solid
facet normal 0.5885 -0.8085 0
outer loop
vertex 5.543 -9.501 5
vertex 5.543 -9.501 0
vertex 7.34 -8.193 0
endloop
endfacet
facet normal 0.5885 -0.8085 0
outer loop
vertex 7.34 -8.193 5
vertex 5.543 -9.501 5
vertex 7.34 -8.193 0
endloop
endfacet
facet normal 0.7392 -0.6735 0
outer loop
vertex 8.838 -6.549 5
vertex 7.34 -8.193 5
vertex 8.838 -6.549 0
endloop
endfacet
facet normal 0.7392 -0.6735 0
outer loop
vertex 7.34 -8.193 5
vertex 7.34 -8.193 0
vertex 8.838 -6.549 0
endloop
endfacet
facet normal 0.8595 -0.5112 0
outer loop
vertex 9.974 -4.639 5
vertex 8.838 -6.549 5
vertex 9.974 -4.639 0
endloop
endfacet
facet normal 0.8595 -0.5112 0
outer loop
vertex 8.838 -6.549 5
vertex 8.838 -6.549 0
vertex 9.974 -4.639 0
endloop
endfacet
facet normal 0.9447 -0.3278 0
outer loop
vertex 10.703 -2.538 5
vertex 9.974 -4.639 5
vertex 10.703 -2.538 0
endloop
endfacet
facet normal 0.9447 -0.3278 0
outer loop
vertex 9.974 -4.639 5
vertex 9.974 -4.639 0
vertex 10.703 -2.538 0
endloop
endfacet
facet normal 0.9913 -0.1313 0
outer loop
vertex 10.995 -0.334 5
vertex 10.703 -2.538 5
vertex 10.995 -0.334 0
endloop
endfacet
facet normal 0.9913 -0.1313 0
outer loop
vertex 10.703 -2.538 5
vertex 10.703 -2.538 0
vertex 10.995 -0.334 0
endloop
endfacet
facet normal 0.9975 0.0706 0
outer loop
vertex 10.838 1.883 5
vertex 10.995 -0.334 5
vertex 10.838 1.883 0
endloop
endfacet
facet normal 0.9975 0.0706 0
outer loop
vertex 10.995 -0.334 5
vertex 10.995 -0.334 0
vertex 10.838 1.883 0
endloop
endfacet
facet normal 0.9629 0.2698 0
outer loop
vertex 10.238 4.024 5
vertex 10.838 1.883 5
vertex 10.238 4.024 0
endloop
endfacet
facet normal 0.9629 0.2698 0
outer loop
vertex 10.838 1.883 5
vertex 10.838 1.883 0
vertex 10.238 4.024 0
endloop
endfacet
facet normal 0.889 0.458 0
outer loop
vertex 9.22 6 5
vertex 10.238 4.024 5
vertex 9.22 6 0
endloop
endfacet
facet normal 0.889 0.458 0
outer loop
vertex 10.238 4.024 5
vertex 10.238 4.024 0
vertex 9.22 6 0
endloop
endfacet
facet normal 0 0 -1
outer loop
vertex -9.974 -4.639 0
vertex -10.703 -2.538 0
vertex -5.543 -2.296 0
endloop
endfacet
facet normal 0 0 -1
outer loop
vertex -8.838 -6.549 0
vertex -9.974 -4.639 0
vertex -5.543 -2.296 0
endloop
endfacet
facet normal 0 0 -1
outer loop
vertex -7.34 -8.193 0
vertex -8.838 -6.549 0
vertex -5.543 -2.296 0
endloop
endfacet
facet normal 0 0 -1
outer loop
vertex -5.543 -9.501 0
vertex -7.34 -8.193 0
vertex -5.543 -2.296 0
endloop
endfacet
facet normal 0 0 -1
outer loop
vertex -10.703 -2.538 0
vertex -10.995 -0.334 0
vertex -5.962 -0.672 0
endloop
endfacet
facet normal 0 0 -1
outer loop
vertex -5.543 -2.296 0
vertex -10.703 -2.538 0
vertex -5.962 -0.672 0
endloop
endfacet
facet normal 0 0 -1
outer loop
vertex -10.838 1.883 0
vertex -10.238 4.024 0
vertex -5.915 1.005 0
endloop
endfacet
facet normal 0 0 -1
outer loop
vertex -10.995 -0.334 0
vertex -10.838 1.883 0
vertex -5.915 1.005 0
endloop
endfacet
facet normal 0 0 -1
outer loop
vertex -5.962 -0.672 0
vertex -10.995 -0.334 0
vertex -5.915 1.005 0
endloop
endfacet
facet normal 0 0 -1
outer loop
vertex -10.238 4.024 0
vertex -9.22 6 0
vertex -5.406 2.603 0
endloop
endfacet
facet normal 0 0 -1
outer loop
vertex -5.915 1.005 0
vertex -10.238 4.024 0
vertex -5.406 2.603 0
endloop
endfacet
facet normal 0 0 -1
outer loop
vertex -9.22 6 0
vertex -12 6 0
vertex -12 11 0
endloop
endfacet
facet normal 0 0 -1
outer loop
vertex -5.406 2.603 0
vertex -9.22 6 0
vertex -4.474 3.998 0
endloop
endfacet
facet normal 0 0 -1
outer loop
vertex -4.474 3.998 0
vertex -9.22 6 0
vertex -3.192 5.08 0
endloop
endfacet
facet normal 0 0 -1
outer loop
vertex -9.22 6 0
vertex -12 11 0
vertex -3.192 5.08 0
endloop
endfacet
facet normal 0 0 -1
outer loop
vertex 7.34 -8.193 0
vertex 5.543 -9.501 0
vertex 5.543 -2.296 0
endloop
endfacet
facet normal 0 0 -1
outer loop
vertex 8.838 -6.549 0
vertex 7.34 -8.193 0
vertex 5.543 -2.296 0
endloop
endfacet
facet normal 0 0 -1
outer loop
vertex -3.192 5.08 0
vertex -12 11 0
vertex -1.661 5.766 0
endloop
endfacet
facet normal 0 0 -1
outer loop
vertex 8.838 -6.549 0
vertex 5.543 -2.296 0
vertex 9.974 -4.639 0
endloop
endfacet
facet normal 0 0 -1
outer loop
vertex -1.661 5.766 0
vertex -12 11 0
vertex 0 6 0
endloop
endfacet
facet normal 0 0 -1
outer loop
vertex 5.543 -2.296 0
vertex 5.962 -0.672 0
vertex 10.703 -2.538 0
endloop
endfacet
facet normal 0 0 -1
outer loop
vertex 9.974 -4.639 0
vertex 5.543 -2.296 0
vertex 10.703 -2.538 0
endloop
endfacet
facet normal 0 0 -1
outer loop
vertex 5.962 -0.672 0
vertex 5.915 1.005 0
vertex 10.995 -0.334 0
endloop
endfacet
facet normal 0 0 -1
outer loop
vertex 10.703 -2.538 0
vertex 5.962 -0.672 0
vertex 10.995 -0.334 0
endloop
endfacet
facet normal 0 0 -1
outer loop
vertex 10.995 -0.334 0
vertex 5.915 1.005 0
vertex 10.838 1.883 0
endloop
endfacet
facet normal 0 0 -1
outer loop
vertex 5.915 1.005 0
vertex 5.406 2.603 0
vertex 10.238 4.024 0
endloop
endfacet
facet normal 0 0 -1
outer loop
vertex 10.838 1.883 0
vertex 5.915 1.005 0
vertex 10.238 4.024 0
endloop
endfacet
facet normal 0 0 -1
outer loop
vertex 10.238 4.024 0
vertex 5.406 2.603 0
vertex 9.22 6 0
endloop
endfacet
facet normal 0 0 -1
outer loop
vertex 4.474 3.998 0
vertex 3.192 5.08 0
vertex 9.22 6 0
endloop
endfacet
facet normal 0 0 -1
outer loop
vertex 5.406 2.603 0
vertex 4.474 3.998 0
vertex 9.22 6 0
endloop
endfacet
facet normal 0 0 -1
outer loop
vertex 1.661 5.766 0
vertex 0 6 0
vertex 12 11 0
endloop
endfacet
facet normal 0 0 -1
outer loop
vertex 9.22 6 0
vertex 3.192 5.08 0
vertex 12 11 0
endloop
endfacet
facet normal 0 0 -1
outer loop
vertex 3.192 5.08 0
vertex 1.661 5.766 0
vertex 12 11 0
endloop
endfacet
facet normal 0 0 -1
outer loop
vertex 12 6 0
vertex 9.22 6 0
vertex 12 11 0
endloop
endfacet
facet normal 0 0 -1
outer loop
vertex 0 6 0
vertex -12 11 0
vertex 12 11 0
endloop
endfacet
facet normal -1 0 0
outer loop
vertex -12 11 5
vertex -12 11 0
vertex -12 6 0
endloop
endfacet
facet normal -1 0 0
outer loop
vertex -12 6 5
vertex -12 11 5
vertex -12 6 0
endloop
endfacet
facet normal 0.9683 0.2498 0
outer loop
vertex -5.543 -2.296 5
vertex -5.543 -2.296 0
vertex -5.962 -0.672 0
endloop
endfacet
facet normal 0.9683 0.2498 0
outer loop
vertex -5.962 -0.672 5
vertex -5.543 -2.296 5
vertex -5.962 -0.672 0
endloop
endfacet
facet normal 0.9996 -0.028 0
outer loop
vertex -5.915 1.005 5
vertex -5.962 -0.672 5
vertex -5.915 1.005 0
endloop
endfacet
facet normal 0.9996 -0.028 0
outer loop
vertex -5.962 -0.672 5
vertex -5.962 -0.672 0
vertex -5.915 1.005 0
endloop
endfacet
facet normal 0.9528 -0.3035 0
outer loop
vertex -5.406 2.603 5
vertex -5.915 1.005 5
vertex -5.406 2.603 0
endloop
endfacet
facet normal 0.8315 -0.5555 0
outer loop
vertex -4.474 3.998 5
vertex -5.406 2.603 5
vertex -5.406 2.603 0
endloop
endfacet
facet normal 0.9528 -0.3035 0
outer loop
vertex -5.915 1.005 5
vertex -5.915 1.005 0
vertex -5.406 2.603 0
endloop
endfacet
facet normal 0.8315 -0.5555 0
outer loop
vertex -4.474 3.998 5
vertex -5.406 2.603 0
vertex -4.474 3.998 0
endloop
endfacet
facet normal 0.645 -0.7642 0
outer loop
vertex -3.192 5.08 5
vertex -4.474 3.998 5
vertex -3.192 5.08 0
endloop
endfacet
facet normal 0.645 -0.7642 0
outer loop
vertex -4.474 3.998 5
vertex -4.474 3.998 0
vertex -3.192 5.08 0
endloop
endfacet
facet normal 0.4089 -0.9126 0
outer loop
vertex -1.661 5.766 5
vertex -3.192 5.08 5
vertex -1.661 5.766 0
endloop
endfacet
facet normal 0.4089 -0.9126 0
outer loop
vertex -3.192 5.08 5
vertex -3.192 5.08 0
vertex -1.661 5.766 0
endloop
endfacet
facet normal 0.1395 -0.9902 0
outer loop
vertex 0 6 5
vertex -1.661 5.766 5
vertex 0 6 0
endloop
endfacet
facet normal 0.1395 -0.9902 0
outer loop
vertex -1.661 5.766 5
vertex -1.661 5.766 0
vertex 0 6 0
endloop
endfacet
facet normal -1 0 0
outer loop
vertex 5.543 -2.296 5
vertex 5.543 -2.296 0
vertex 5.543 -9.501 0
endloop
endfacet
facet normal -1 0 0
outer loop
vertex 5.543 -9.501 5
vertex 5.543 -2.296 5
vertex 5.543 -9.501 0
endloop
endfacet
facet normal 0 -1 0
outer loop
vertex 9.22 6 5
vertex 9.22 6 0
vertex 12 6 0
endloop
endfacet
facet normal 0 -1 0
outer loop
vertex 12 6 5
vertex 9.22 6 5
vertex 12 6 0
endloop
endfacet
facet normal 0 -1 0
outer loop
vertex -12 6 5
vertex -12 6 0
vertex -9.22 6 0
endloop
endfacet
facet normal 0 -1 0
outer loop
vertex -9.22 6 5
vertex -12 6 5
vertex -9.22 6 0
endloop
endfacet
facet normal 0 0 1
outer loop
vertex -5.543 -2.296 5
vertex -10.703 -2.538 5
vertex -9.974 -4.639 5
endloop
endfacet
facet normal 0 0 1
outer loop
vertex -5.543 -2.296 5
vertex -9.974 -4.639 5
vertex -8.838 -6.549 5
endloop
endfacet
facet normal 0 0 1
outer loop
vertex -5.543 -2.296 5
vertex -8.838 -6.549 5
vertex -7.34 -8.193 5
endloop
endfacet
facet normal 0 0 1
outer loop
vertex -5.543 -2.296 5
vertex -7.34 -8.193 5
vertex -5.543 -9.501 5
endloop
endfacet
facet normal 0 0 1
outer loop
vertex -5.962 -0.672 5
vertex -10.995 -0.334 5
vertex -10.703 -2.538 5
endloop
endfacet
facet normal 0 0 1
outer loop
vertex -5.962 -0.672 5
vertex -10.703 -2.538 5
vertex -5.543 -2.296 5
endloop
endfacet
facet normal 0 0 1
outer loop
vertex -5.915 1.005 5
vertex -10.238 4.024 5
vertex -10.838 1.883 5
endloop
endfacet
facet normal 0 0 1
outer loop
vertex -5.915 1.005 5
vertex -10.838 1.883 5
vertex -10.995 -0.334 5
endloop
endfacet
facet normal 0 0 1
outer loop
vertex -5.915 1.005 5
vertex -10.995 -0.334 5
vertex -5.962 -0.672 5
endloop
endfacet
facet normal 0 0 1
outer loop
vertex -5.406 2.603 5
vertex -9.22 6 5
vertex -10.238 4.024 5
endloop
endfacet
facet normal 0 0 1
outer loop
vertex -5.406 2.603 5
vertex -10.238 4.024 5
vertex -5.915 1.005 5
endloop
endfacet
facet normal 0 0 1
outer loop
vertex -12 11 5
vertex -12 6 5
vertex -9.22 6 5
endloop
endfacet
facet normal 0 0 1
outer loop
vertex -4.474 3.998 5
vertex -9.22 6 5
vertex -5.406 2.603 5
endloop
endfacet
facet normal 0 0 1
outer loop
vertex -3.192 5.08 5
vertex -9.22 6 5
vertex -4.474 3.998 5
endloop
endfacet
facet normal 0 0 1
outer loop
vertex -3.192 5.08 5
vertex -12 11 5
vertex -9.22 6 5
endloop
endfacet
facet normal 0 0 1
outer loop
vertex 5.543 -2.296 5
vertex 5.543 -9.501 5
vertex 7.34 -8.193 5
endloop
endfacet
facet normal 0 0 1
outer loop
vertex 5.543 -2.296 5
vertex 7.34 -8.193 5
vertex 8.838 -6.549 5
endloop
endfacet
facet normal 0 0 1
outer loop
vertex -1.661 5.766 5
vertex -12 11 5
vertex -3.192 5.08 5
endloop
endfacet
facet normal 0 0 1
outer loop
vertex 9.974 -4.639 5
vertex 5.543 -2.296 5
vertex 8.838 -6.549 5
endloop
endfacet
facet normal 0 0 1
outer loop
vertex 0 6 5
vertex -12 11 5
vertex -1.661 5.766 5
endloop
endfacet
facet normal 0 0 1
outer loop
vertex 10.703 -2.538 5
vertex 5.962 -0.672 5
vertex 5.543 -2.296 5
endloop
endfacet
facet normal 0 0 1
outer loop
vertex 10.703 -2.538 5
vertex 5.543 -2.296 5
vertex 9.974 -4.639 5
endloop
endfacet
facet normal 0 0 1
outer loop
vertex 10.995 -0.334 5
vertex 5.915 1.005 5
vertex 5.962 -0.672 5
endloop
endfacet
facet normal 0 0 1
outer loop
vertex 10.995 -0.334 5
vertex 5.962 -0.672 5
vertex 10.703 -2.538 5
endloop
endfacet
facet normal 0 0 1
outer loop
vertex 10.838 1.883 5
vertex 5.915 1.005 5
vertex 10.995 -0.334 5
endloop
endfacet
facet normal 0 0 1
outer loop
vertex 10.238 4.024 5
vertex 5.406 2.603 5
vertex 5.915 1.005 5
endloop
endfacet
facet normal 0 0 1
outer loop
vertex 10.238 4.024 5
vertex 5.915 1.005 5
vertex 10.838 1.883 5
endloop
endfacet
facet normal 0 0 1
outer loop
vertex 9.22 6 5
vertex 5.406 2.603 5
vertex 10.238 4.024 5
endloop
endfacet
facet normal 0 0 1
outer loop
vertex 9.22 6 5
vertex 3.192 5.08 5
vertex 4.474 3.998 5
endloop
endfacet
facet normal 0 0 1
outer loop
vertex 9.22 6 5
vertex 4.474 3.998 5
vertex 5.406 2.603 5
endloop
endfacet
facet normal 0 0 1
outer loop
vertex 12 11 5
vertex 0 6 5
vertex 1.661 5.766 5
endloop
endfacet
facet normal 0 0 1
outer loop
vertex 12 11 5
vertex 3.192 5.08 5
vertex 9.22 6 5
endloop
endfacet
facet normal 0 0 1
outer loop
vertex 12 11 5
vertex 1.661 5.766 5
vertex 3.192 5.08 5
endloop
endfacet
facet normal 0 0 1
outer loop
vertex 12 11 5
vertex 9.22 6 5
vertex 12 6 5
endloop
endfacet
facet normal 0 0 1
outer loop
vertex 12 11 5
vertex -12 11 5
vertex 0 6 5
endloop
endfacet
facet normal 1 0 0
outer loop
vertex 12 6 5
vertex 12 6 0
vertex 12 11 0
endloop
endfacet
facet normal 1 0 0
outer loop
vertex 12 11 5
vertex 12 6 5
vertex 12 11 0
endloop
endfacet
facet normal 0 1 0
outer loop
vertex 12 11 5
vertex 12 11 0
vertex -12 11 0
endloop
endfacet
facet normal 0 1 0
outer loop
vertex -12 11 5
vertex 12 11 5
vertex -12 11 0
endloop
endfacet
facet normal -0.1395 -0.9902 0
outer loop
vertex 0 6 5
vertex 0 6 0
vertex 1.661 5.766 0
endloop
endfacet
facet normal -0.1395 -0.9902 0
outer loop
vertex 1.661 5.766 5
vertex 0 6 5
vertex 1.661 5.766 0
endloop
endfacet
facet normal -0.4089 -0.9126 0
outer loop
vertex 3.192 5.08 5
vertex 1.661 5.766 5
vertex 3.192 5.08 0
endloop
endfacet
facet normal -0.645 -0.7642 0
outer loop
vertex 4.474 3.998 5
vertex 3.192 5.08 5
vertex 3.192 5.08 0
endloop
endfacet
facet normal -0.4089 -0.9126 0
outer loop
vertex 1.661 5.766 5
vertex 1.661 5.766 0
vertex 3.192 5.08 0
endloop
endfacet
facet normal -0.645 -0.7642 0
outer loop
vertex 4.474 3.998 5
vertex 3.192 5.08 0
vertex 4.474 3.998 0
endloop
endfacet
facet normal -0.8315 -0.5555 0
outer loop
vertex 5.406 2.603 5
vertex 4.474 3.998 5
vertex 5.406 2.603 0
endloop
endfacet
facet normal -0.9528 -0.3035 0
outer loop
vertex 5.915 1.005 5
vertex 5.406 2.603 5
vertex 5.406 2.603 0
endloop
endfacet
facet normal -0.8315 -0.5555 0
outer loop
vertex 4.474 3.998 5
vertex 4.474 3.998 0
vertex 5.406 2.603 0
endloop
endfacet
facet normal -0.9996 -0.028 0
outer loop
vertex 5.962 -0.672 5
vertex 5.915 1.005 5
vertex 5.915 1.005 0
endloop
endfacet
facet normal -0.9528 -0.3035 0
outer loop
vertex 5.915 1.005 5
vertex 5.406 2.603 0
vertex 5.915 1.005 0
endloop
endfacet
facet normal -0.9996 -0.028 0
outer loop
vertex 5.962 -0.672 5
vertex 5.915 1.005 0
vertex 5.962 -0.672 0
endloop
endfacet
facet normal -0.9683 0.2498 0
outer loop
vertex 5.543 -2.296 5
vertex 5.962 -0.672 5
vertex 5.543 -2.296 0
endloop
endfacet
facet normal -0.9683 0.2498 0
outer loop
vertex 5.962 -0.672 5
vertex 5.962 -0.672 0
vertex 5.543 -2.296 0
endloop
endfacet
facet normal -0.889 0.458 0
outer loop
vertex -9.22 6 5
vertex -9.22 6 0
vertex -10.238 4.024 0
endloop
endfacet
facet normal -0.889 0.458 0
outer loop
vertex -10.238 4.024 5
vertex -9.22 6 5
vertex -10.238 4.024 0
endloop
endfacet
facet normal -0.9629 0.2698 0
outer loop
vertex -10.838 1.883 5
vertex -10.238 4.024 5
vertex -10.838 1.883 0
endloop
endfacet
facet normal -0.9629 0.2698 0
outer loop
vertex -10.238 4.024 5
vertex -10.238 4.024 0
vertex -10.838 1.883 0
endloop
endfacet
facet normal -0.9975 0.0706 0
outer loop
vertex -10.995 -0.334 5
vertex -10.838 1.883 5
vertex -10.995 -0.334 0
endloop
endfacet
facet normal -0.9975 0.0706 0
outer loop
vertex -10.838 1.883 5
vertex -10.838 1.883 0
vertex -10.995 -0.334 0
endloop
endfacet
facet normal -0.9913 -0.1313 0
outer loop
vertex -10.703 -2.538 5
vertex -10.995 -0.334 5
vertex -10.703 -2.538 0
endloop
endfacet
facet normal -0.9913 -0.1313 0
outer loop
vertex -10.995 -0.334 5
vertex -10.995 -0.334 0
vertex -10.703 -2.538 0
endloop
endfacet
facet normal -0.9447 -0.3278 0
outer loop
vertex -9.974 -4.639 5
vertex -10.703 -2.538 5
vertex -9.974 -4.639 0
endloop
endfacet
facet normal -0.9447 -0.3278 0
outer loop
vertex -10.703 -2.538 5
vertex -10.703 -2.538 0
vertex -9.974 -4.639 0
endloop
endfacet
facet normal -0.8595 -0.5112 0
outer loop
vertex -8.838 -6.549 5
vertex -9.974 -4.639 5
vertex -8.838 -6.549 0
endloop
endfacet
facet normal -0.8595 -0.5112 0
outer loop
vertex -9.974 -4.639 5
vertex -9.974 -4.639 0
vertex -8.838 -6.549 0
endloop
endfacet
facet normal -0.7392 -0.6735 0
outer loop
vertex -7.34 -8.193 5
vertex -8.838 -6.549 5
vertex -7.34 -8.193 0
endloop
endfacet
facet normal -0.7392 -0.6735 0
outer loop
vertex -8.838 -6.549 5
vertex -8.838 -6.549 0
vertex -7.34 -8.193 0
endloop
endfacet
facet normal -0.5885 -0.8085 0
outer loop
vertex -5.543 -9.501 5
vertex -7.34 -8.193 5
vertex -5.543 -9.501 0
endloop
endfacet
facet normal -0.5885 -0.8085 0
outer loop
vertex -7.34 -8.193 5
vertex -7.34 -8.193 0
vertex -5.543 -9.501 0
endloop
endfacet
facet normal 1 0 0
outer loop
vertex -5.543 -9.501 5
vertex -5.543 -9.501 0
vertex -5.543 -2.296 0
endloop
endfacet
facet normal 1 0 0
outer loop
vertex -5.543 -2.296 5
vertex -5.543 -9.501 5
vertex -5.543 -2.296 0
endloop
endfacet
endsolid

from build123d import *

# Parameters (mm, degrees)
F1_DEPTH = 5


with BuildPart() as f1:
    # F0 (on Top) → F1 (new body)
    with BuildSketch(Plane.XY):
        with BuildLine():
            ThreePointArc((1.28e-08, 6), (4.9888176774, 3.3334213928), (5.5432771951, -2.2961005942))
            Line((5.5432771951, -2.2961005942), (5.5432771951, -9.5011619257))
            ThreePointArc((5.5432771951, -9.5011619257), (10.703117819, -2.5383595004), (9.2195444573, 6))
            Line((9.2195444573, 6), (1.28e-08, 6))
        make_face()
        with BuildLine():
            ThreePointArc((-5.5432771951, -2.2961005942), (-4.9888176703, 3.3334214034), (1.28e-08, 6))
            Line((1.28e-08, 6), (-9.2195444573, 6))
            ThreePointArc((-9.2195444573, 6), (-10.703117819, -2.5383595004), (-5.5432771951, -9.5011619257))
            Line((-5.5432771951, -9.5011619257), (-5.5432771951, -2.2961005942))
        make_face()
        with BuildLine():
            Line((-9.2195444573, 6), (1.28e-08, 6))
            Line((1.28e-08, 6), (9.2195444573, 6))
            ThreePointArc((9.2195444573, 6), (5.2440442409, 9.6695398029), (0, 11))
            ThreePointArc((0, 11), (-5.2440442409, 9.6695398029), (-9.2195444573, 6))
        make_face()
        with BuildLine():
            Line((-12, 6), (-9.2195444573, 6))
            ThreePointArc((-9.2195444573, 6), (-5.2440442409, 9.6695398029), (0, 11))
            Line((0, 11), (-12, 11))
            Line((-12, 11), (-12, 6))
        make_face()
        with BuildLine():
            ThreePointArc((0, 11), (5.2440442409, 9.6695398029), (9.2195444573, 6))
            Line((9.2195444573, 6), (12, 6))
            Line((12, 6), (12, 11))
            Line((12, 11), (0, 11))
        make_face()
    extrude(amount=F1_DEPTH)


solid = f1.part
